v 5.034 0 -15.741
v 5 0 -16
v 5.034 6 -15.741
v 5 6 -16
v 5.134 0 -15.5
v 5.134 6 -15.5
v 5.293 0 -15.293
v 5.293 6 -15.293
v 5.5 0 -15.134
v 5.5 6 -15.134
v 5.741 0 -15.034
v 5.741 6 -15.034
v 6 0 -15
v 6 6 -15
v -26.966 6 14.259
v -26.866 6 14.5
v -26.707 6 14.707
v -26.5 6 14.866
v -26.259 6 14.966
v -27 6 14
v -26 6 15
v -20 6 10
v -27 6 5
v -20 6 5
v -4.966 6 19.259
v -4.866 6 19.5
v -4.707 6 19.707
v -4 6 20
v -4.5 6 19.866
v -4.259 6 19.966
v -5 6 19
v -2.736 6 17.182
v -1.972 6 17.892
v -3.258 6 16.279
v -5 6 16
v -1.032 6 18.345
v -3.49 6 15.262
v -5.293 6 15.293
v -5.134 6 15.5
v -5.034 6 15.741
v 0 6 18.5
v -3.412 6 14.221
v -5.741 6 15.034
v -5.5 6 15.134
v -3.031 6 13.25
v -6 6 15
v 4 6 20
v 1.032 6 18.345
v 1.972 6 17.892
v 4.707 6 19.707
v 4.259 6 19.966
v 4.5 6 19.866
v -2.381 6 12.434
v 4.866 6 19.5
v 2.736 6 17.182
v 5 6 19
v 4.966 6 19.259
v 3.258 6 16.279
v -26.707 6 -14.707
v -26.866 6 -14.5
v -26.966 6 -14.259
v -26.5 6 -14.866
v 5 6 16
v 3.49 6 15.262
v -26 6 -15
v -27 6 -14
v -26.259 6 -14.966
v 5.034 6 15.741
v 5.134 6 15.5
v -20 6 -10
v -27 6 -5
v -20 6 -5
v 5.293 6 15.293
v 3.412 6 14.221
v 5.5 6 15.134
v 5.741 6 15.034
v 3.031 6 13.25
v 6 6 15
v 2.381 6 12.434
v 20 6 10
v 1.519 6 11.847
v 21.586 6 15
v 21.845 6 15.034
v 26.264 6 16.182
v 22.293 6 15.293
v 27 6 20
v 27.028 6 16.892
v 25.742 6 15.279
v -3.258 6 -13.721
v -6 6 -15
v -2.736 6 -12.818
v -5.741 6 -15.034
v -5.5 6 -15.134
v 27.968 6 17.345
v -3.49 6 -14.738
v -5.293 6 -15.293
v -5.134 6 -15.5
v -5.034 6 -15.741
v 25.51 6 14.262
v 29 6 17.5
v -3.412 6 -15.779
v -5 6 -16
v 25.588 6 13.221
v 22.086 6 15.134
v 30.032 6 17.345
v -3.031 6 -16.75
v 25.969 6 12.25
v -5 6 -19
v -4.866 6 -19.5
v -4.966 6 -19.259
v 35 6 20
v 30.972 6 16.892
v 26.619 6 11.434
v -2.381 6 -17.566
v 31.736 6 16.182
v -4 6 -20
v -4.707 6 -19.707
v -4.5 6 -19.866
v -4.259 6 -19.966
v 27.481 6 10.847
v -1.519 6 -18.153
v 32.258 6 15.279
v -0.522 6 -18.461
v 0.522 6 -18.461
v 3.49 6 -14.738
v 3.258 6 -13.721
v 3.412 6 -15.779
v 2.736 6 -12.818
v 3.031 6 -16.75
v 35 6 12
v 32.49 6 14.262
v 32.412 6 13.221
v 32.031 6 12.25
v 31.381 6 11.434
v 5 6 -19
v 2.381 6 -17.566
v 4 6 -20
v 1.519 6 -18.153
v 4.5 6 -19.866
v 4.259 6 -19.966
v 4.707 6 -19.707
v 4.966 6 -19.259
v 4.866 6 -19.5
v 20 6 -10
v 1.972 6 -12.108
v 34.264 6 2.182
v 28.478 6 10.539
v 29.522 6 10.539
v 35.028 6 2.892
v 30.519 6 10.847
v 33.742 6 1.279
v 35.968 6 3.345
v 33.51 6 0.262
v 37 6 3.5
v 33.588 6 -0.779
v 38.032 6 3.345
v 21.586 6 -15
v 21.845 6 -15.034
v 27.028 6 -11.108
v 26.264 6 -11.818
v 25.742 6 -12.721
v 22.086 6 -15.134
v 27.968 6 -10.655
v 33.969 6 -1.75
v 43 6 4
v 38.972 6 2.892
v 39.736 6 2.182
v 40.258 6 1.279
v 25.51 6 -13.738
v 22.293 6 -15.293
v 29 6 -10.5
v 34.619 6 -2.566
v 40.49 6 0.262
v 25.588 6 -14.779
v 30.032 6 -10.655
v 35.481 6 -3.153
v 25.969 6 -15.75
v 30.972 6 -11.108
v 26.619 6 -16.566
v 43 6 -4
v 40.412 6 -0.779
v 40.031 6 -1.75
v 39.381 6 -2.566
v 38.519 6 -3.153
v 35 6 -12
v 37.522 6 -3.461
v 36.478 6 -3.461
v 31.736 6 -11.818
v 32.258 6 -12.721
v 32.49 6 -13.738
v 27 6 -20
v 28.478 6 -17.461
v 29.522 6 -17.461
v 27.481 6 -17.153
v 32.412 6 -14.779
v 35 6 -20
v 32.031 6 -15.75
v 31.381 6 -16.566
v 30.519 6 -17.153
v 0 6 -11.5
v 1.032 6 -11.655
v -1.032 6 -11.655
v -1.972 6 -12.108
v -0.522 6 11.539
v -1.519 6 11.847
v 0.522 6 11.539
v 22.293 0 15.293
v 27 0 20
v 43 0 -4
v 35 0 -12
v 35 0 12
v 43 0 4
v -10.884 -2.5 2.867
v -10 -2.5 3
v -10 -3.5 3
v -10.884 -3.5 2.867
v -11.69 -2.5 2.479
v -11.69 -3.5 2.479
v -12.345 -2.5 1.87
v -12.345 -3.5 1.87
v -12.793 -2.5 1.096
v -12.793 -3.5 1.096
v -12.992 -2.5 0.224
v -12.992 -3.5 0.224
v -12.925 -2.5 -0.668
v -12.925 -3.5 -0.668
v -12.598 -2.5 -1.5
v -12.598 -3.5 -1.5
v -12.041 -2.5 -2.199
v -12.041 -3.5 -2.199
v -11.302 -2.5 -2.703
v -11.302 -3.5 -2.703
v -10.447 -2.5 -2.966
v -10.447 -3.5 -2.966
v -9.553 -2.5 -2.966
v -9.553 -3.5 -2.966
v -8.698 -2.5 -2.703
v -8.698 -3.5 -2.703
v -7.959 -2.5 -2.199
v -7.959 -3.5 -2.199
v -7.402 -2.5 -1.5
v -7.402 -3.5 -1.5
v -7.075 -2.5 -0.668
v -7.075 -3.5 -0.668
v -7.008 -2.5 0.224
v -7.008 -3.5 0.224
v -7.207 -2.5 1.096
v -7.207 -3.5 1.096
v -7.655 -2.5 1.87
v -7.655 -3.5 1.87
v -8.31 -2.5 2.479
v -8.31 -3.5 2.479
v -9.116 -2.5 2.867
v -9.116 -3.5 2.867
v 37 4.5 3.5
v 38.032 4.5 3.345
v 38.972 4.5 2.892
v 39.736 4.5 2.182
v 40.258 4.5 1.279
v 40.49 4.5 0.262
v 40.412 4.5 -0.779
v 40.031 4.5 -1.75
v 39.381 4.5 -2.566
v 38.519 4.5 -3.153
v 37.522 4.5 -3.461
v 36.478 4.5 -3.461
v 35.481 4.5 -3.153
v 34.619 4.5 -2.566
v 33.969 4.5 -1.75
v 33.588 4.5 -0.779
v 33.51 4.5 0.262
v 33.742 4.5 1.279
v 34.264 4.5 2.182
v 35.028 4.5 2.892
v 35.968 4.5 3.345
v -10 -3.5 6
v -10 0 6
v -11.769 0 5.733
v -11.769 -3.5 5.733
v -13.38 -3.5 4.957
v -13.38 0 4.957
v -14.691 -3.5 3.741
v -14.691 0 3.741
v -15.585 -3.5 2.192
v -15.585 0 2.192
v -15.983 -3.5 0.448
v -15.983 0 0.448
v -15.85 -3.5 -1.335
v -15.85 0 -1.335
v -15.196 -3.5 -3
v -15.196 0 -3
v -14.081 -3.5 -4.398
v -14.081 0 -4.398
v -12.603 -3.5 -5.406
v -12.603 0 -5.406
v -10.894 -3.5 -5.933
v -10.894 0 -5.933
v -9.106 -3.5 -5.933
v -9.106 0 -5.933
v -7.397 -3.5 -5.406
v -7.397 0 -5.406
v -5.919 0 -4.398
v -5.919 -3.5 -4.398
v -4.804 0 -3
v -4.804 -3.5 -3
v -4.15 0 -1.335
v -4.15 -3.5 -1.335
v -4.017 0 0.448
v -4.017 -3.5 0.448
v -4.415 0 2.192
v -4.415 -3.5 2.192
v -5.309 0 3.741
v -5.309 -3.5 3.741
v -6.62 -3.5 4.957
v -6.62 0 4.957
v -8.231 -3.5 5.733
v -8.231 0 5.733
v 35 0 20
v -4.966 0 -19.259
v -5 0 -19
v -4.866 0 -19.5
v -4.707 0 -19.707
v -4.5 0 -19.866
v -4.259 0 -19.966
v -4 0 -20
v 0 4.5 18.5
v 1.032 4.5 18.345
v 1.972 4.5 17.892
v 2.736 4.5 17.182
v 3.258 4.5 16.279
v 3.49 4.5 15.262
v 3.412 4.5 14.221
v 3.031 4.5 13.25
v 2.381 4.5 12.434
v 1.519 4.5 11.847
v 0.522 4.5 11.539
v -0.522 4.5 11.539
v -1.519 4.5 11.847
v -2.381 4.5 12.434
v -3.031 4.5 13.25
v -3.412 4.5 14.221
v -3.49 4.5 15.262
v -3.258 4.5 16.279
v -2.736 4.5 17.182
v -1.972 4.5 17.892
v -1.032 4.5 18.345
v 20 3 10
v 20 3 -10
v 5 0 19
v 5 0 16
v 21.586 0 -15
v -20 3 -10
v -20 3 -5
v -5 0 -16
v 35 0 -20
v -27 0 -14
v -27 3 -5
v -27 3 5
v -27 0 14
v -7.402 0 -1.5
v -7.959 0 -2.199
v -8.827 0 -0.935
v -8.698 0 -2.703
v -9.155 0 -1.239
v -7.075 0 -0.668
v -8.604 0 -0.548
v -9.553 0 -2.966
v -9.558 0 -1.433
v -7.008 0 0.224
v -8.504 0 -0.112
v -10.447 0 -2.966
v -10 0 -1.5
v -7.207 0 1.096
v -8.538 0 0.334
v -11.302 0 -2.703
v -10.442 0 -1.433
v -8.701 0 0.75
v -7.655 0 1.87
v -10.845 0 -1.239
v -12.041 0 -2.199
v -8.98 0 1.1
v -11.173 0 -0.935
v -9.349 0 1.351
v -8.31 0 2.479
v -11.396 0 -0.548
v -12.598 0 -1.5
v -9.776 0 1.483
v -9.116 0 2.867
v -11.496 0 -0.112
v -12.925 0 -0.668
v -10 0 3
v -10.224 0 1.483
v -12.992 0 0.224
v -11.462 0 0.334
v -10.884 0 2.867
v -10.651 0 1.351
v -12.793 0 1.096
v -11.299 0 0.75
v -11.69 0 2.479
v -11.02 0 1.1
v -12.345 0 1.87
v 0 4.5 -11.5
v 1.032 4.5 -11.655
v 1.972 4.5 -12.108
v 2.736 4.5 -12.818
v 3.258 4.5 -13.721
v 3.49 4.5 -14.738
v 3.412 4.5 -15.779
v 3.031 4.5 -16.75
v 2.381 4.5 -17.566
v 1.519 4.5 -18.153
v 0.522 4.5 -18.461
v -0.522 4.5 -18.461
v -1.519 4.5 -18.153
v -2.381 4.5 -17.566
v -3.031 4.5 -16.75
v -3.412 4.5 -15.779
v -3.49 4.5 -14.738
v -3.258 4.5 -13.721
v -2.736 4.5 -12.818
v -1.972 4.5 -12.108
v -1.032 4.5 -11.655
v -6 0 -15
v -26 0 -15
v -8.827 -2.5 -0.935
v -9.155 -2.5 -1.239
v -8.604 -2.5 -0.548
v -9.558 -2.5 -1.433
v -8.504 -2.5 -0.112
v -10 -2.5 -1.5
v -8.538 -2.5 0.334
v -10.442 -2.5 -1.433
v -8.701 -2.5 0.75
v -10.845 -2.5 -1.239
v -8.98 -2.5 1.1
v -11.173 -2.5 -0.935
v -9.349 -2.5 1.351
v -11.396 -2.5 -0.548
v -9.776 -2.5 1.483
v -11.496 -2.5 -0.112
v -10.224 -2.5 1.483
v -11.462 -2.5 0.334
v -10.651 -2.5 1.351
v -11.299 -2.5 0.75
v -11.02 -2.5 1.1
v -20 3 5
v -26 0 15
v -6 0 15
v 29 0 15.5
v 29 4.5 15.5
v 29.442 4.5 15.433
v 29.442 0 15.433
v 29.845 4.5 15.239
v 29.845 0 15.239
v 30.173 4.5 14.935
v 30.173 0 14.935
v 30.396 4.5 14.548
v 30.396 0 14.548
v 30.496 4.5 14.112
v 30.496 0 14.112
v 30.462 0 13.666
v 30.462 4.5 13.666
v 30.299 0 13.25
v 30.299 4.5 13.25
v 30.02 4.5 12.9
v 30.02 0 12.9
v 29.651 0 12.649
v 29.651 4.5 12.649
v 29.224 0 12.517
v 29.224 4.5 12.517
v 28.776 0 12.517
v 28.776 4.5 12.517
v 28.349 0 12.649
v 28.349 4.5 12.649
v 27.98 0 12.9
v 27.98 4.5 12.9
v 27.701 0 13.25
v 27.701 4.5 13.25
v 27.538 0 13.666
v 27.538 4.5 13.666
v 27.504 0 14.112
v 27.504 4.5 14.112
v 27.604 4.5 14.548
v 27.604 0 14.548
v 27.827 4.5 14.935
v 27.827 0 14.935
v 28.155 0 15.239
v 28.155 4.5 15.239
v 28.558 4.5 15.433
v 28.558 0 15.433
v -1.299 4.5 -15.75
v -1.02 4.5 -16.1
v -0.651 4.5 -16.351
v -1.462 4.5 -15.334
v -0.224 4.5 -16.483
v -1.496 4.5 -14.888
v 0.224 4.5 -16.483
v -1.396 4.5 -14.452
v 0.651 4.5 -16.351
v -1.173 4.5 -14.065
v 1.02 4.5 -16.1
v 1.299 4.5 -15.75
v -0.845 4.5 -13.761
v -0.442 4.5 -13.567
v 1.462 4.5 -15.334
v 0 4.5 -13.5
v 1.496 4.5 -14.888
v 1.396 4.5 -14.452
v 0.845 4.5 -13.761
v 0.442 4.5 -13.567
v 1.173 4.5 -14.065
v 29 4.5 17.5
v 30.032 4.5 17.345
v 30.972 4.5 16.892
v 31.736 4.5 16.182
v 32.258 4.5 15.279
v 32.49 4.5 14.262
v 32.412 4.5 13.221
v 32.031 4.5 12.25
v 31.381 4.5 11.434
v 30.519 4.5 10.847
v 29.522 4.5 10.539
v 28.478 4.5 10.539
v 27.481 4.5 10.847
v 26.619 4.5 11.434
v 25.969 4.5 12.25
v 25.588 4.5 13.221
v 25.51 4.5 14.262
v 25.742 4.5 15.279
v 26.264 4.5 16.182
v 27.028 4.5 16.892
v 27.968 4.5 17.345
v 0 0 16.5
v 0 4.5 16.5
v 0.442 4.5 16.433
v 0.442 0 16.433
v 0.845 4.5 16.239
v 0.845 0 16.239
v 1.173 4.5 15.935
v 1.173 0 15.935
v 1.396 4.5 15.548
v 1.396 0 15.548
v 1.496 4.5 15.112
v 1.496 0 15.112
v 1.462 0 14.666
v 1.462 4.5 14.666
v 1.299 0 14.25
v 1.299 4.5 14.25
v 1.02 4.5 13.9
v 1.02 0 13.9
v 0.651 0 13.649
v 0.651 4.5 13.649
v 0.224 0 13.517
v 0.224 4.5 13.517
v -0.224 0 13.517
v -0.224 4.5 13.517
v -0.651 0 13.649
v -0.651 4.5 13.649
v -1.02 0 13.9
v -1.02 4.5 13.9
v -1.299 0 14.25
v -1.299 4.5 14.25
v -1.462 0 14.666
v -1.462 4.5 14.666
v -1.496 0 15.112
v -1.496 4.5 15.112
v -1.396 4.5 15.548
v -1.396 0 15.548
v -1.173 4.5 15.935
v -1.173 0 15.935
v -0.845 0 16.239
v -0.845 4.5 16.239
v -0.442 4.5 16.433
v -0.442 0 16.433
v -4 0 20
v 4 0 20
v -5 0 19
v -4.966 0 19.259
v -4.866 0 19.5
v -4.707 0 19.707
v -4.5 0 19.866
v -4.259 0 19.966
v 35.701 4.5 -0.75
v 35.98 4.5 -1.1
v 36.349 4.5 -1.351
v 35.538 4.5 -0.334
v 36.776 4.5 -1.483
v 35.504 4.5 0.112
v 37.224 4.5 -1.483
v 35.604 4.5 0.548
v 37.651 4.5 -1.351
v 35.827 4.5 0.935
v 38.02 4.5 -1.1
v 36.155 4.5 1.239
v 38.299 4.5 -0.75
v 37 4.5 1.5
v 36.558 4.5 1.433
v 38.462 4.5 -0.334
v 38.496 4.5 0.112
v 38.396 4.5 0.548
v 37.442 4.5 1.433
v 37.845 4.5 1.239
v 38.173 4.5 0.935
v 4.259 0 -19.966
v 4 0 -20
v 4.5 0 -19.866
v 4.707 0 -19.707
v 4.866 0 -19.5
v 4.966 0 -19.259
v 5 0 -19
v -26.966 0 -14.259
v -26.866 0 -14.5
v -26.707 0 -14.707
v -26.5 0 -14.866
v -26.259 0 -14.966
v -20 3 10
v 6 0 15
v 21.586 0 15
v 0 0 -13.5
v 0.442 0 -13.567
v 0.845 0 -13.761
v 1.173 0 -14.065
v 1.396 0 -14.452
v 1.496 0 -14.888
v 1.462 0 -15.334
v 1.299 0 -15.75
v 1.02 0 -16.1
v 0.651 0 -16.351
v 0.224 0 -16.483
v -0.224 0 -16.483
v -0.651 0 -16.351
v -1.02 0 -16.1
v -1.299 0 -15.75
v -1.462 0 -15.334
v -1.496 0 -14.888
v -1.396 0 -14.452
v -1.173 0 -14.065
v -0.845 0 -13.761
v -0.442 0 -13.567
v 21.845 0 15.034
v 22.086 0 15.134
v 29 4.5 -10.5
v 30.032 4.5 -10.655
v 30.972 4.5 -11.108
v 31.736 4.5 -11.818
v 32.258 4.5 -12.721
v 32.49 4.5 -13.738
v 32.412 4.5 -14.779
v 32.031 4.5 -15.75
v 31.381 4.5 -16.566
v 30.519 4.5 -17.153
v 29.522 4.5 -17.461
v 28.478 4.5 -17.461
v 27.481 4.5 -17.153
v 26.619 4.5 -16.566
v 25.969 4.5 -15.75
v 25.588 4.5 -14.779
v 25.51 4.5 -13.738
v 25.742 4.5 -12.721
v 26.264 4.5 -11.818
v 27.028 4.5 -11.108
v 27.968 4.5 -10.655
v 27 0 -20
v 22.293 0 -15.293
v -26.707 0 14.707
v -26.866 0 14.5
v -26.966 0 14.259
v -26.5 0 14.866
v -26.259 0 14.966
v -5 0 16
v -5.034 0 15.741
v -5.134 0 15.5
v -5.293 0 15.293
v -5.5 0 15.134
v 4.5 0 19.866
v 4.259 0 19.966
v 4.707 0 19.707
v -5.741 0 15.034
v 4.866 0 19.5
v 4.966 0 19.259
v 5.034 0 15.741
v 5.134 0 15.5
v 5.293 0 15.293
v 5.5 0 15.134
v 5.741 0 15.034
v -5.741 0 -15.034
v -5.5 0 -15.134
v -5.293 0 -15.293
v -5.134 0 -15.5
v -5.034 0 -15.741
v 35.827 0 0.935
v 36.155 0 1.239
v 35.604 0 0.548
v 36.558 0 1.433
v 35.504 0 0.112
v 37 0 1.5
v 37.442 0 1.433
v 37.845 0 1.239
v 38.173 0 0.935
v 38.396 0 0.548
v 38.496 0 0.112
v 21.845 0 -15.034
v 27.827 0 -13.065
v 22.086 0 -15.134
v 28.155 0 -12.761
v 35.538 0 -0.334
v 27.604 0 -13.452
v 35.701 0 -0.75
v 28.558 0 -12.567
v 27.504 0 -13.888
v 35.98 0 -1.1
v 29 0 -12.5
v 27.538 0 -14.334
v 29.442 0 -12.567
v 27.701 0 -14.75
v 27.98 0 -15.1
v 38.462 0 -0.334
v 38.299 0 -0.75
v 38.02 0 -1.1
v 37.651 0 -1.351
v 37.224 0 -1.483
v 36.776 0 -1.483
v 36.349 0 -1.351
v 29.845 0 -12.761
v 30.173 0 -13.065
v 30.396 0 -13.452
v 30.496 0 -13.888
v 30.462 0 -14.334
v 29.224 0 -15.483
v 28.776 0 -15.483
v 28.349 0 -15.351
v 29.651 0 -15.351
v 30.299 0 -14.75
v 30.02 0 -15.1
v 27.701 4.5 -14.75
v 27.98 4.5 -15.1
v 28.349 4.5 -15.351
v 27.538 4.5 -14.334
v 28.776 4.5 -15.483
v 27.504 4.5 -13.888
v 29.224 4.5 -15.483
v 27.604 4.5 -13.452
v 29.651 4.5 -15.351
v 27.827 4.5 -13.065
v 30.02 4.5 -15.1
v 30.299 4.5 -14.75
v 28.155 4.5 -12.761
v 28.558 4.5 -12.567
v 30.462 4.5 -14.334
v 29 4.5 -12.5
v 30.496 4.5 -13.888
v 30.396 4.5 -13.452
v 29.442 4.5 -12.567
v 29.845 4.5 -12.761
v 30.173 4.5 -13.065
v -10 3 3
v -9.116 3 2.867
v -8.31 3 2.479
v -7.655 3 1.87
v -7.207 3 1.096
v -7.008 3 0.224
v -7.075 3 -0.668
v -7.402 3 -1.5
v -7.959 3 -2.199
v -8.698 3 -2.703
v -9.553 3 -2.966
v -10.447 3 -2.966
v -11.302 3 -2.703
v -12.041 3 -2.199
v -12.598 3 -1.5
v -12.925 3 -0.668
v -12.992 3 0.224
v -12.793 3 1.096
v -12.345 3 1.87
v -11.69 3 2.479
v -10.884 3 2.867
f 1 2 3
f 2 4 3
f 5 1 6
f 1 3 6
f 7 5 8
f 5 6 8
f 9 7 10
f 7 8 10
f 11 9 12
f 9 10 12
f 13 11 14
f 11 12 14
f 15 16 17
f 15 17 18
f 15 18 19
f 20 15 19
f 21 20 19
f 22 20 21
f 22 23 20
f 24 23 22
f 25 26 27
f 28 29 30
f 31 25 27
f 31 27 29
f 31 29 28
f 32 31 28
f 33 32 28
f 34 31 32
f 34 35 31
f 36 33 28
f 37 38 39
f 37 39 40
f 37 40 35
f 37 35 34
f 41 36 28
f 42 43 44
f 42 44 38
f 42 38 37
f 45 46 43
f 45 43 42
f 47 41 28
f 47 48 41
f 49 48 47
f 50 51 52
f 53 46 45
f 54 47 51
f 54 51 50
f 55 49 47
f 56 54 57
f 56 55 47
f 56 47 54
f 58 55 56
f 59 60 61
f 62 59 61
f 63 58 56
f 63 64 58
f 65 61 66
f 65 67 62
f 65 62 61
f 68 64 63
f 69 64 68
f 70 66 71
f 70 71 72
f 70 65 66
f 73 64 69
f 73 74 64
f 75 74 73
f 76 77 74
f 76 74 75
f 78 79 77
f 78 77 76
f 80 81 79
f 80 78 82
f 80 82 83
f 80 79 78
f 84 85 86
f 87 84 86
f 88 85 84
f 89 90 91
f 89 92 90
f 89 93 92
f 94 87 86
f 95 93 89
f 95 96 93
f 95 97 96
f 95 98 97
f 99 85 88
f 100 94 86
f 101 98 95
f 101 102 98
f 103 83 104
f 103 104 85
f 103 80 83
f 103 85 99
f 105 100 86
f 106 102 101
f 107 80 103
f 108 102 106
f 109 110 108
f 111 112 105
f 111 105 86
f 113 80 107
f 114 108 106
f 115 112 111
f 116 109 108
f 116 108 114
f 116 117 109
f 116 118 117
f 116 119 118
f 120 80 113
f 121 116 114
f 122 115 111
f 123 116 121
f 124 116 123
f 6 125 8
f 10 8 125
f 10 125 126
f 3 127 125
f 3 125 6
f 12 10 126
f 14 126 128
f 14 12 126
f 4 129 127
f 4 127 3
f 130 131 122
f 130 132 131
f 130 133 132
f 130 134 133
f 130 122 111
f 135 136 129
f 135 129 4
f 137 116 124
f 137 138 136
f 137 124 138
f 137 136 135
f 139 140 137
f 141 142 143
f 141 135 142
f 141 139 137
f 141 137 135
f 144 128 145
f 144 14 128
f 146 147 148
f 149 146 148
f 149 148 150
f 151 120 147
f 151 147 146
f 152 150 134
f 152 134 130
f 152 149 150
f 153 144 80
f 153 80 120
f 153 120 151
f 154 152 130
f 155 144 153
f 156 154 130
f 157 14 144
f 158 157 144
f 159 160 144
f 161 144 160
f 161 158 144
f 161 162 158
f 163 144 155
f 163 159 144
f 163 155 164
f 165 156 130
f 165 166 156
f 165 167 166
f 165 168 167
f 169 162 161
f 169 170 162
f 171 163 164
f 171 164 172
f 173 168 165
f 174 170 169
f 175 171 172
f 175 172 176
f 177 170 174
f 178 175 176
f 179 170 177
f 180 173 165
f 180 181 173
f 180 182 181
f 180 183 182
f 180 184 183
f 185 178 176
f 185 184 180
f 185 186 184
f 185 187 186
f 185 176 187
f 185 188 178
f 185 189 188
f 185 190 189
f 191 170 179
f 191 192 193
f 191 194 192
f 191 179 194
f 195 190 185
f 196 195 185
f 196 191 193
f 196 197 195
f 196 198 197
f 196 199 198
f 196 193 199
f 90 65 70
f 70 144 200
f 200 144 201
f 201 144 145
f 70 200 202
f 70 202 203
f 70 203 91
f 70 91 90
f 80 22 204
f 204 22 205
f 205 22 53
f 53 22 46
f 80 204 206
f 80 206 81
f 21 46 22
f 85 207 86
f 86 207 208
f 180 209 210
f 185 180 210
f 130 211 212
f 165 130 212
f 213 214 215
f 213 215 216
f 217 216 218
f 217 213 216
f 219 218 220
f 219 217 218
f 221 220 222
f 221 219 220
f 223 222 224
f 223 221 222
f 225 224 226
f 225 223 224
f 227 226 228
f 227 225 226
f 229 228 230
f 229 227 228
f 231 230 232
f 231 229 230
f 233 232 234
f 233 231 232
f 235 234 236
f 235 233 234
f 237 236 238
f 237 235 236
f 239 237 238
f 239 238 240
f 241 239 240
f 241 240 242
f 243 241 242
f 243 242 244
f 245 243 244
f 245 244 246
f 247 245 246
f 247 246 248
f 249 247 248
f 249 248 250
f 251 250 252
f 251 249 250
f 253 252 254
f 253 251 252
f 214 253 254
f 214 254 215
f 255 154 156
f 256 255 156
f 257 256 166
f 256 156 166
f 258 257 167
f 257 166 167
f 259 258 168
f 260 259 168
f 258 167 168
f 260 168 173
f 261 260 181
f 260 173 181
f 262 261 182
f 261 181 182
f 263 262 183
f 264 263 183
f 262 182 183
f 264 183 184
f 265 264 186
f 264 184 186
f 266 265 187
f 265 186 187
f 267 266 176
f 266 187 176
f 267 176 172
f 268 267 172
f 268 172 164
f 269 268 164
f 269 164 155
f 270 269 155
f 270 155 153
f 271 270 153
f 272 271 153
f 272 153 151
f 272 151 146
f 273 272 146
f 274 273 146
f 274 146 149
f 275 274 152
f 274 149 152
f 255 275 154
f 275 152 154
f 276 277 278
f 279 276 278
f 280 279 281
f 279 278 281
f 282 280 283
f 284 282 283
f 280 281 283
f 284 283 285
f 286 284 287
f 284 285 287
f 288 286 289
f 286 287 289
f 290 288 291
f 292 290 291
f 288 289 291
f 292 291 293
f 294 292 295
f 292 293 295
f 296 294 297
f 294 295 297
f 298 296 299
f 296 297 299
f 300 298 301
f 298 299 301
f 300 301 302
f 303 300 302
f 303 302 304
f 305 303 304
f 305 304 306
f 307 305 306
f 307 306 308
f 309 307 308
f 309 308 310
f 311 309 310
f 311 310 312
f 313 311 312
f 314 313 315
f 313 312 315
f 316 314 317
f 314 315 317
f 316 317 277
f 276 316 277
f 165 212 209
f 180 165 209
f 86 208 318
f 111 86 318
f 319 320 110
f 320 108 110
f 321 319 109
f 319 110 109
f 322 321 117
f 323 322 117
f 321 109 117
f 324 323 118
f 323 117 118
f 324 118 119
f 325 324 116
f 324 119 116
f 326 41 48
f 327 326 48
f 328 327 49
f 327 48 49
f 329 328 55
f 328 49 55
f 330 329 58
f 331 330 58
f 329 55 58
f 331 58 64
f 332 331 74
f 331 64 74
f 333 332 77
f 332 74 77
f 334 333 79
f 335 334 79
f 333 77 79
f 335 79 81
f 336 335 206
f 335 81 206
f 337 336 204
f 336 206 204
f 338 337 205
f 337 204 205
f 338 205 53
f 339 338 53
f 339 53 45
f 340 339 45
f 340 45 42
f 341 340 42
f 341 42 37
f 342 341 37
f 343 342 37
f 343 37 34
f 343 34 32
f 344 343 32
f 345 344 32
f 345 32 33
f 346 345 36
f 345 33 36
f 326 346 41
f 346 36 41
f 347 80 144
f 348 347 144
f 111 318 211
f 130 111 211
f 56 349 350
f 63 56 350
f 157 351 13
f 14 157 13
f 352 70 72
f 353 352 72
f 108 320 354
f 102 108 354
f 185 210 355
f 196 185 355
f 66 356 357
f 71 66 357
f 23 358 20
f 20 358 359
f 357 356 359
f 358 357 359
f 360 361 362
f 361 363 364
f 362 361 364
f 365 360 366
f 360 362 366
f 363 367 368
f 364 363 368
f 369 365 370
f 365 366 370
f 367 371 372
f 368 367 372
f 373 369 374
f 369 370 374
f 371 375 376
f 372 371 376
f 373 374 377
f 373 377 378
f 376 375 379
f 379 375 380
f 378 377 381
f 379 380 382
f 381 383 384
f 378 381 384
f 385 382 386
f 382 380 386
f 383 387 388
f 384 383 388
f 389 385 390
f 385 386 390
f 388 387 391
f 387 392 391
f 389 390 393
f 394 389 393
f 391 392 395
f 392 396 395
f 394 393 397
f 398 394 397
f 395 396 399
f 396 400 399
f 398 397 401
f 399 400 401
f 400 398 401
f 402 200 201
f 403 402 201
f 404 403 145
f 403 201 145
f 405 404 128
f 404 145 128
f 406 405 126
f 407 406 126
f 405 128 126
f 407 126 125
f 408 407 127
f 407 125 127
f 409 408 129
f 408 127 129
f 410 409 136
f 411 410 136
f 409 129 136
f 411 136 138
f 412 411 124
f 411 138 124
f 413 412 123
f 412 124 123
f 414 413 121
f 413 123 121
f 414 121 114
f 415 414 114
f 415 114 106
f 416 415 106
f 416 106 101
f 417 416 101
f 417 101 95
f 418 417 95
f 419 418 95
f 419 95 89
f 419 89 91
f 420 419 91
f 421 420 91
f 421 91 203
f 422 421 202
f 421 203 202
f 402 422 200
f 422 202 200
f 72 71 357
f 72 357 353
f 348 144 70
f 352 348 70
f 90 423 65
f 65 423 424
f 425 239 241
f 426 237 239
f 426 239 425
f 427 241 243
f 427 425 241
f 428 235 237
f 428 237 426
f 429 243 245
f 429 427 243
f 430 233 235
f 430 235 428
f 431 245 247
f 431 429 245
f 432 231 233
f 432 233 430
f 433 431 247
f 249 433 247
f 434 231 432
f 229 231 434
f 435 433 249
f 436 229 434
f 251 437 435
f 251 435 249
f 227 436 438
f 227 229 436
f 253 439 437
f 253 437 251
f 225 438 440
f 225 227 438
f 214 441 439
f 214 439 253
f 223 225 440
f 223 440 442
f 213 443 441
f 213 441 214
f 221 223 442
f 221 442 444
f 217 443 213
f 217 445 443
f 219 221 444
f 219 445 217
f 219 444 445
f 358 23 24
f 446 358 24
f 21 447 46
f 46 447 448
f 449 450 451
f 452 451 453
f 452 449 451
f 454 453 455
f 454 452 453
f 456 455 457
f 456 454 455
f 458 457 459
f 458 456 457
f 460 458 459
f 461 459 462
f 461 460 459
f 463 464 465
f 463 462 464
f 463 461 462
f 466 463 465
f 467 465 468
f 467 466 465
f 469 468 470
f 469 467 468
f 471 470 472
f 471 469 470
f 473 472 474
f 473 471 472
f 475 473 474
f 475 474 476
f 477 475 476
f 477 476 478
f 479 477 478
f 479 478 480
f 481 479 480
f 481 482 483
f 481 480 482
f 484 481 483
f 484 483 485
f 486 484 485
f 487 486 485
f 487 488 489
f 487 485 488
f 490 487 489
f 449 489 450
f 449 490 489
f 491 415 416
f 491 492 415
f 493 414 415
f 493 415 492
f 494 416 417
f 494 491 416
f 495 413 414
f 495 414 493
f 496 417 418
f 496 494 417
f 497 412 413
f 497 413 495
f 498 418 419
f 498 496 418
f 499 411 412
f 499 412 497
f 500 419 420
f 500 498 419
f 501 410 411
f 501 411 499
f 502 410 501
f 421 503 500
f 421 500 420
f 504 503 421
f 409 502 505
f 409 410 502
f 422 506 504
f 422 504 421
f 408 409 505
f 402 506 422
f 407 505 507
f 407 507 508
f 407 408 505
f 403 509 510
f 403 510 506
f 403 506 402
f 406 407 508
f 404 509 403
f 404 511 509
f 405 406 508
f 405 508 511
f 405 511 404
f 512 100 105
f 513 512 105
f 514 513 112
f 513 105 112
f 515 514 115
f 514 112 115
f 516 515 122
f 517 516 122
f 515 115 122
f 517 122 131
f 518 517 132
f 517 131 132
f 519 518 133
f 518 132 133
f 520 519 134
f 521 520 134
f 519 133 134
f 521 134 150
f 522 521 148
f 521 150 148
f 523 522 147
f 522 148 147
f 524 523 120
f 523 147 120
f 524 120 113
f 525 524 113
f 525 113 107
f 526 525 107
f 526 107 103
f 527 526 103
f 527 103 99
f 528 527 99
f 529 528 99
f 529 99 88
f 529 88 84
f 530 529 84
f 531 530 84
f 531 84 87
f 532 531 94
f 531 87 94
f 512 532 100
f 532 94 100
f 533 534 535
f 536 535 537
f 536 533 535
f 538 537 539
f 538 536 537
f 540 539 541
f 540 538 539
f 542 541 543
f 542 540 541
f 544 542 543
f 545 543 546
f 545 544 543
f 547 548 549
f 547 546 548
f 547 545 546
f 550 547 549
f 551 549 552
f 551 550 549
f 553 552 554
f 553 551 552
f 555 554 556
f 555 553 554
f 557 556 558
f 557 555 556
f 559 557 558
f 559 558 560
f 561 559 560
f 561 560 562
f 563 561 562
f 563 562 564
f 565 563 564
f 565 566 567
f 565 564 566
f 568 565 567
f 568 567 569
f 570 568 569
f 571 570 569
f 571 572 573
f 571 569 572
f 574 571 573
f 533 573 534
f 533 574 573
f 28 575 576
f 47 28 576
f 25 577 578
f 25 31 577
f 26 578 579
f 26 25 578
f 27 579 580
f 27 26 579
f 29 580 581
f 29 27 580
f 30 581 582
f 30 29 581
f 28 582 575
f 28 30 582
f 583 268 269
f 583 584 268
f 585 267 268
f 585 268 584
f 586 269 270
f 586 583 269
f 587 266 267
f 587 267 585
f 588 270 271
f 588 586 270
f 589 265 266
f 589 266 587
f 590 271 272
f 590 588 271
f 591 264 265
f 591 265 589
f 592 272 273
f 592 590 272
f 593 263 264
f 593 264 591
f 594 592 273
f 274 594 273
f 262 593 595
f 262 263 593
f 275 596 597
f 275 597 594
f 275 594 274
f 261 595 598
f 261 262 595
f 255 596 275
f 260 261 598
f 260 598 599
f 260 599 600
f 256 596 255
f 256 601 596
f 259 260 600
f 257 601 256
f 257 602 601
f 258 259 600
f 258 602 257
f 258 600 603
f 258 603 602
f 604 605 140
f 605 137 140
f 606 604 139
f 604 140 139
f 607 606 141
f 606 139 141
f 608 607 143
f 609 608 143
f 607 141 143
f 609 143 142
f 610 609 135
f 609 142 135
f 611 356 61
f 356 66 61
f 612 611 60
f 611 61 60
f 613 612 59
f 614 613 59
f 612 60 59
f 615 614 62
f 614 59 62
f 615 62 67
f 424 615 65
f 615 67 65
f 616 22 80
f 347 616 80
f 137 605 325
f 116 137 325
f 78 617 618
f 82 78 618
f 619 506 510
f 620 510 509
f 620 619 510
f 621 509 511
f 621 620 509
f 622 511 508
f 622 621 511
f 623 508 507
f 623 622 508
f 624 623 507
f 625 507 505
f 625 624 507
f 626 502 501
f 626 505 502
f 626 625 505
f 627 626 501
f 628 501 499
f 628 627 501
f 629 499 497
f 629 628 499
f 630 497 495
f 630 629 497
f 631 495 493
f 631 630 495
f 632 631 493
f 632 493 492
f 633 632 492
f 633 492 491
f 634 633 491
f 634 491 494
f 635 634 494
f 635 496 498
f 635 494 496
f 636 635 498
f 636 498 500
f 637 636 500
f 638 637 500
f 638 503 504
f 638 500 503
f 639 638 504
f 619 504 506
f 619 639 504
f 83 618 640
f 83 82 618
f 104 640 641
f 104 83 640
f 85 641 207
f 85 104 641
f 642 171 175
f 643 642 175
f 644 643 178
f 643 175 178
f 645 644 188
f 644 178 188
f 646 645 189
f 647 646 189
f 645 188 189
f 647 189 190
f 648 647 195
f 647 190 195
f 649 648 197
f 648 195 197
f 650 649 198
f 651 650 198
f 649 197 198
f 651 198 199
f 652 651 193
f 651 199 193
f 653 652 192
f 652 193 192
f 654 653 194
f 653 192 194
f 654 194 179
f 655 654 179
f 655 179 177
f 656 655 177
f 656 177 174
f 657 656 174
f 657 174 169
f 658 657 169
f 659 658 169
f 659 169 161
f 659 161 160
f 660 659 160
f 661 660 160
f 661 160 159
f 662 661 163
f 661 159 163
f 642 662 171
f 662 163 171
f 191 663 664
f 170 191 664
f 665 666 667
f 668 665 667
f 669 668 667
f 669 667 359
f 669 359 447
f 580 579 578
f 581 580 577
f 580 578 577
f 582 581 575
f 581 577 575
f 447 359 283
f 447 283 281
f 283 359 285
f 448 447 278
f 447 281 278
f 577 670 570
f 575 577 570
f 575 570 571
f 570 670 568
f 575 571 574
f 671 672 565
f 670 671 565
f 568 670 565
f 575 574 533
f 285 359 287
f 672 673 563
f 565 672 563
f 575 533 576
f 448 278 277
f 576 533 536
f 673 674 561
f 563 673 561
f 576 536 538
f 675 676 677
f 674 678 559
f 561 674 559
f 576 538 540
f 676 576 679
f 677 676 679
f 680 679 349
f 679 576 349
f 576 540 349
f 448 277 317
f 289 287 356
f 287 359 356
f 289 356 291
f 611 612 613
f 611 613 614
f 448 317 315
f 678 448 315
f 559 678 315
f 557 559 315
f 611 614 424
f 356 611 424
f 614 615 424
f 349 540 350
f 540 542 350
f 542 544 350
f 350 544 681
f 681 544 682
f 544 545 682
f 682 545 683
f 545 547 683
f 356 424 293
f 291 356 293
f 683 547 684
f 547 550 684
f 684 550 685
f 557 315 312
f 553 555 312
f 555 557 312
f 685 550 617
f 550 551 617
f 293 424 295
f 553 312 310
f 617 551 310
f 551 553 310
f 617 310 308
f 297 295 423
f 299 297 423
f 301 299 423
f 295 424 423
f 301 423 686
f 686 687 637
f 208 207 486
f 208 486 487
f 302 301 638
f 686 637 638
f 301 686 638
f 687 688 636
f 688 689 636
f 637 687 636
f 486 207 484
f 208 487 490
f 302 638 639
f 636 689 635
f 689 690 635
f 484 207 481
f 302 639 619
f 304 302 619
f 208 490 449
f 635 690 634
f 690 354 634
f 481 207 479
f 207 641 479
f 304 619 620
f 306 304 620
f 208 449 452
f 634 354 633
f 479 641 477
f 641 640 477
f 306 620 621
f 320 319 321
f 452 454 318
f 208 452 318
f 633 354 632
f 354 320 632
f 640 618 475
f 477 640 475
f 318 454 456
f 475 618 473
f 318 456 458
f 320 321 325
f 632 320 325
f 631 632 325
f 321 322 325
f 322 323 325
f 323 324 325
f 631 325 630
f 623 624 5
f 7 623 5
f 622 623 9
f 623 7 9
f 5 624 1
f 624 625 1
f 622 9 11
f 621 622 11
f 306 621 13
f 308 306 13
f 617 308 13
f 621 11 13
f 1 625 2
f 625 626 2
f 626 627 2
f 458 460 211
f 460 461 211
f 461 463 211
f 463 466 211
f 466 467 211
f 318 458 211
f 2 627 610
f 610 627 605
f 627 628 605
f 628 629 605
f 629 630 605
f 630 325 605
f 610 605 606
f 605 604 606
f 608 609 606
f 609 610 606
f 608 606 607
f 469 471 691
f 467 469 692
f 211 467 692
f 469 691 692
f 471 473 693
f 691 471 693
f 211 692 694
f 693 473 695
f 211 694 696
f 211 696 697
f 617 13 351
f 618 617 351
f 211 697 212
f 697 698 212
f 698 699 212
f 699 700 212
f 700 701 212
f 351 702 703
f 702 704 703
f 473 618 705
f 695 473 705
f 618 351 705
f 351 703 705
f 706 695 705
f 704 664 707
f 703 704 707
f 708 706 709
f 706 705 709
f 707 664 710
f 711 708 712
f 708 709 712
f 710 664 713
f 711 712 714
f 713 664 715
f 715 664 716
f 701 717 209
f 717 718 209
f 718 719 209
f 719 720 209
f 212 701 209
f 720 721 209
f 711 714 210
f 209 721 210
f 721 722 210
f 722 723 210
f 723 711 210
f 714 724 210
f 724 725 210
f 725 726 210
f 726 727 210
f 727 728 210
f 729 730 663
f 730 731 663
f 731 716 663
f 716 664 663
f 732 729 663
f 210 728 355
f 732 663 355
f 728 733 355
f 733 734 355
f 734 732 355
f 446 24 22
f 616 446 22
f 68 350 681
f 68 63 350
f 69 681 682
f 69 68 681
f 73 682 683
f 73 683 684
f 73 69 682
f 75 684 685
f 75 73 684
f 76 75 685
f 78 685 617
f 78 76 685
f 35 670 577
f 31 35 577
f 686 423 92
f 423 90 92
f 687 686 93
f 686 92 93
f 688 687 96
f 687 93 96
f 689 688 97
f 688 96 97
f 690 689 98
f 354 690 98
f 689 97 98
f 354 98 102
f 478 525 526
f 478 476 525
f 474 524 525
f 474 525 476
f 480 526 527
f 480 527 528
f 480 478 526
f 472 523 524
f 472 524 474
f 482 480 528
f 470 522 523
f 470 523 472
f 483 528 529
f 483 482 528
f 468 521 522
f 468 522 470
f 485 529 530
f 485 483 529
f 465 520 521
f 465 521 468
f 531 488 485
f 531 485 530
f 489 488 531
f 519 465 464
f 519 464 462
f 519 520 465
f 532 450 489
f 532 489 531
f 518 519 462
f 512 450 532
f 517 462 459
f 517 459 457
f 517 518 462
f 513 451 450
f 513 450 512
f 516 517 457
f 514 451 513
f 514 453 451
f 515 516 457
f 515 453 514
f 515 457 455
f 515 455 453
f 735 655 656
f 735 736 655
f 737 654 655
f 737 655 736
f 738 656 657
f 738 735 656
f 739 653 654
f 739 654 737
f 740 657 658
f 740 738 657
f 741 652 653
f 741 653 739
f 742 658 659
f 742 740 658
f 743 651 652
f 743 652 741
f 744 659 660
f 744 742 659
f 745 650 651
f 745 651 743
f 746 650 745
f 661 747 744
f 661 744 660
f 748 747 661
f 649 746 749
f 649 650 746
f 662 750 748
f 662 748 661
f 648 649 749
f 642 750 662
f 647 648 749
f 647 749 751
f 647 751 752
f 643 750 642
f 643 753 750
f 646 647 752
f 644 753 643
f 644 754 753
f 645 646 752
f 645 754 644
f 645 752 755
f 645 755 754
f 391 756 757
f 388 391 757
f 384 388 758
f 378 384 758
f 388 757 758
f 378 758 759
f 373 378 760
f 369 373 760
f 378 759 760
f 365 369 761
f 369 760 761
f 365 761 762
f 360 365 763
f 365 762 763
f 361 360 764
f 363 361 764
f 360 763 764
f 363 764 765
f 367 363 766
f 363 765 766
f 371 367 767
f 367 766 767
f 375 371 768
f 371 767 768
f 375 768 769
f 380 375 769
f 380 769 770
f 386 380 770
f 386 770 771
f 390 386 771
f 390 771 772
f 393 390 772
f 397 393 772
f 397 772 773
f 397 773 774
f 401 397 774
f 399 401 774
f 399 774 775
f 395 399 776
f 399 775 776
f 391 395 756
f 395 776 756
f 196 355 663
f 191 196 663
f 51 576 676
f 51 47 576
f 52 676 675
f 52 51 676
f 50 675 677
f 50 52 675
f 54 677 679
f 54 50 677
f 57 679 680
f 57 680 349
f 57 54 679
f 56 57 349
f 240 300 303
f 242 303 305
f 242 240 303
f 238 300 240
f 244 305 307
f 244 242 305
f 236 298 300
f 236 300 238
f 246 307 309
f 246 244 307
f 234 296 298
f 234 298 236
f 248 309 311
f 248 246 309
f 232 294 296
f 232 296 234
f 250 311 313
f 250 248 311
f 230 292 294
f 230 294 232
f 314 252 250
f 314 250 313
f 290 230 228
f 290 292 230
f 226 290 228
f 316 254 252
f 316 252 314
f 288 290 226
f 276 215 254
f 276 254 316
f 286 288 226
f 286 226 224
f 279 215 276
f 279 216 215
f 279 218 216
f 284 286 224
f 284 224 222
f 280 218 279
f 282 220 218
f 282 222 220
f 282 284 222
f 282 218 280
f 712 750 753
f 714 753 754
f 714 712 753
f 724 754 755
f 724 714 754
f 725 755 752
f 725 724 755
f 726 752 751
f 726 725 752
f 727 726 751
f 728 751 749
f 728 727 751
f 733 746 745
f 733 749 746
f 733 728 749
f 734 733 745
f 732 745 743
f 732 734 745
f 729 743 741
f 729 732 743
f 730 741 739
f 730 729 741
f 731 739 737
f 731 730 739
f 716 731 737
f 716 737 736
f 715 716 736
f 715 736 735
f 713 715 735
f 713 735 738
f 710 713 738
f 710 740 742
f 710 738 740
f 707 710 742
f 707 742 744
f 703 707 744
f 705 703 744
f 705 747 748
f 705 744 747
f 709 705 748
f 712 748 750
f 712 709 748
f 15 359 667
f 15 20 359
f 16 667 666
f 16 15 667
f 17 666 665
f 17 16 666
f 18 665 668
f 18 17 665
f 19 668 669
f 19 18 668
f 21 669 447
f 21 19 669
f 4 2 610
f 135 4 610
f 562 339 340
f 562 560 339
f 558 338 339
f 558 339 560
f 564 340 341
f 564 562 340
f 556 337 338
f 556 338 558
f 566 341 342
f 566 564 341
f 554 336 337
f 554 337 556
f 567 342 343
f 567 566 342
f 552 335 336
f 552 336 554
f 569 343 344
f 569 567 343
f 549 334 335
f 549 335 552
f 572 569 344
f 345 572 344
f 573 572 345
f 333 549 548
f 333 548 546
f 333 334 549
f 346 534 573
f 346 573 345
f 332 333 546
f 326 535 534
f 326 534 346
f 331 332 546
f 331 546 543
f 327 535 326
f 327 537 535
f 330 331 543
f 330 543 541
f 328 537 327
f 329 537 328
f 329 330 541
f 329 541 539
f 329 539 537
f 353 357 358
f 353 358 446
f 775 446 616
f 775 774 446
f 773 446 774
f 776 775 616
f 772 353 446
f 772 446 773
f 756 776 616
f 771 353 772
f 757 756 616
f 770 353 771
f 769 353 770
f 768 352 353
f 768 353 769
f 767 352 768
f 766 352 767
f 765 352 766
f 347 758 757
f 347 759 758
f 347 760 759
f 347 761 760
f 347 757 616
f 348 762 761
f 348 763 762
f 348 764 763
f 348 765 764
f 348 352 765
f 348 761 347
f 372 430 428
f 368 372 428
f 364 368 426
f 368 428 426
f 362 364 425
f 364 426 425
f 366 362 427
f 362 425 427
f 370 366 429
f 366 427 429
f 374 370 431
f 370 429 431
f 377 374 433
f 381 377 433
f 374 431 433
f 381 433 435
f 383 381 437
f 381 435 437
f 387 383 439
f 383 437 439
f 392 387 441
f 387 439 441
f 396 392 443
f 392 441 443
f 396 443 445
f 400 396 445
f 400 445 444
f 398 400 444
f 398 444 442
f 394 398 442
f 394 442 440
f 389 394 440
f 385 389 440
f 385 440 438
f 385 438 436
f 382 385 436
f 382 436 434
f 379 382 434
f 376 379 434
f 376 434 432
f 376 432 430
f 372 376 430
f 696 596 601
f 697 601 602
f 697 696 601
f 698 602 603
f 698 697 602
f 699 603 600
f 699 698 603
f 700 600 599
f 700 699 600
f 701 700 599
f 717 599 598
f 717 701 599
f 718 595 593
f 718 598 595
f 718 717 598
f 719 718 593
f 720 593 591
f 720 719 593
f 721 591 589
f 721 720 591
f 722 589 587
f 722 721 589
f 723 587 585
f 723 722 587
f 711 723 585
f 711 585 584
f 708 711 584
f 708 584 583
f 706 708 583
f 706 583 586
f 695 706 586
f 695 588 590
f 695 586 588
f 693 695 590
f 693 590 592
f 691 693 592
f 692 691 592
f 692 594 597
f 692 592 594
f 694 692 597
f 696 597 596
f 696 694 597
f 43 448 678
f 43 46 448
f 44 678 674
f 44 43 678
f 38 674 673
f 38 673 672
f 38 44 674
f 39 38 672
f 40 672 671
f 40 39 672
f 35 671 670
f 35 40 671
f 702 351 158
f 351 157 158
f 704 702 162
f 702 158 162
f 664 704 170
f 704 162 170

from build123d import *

# Parameters (mm, degrees)
SKETCH_1_R          = 1.5
EXTRUDE_1_DEPTH     = 6
SKETCH_2_W          = 7
SKETCH_2_H          = 5
CUT_EXTRUDE_1_DEPTH = 3
SKETCH_3_R          = 3.5
CUT_EXTRUDE_2_DEPTH = 1.5
SKETCH_5_R          = 3
CUT_EXTRUDE_3_DEPTH = 3
SKETCH_6_R          = 6
EXTRUDE_2_DEPTH     = 3.5
CUT_EXTRUDE_START   = -1
SKETCH_7_R          = 3
CUT_EXTRUDE_4_DEPTH = 1
SKETCH_8_R          = 1.5
CUT_EXTRUDE_5_DEPTH = 49.179352424
FILLET_1_R          = 1


with BuildPart() as part:
    # 草图1 → 凸台-拉伸1 (new body)
    with BuildSketch(Plane(origin=(0, 0, 0), x_dir=(1, 0, 0), z_dir=(0, 1, 0))):
        Polygon((-27, 15), (-27, -15), (-5, -15), (-5, -20), (5, -20), (5, -15), (22, -15), (27, -20), (35, -20), (35, -12), (43, -4), (43, 4), (35, 12), (35, 20), (27, 20), (22, 15), (5, 15), (5, 20), (-5, 20), (-5, 15), align=None)
        with Locations(Location((0, 15, 0), (0, 0, 270))):
            Circle(SKETCH_1_R, mode=Mode.SUBTRACT)
        with Locations(Location((0, -15, 0), (0, 0, 270))):
            Circle(SKETCH_1_R, mode=Mode.SUBTRACT)
        with Locations(Location((29, 14, 0), (0, 0, 270))):
            Circle(SKETCH_1_R, mode=Mode.SUBTRACT)
        with Locations(Location((37, 0, 0), (0, 0, 270))):
            Circle(SKETCH_1_R, mode=Mode.SUBTRACT)
        with Locations(Location((29, -14, 0), (0, 0, 270))):
            Circle(SKETCH_1_R, mode=Mode.SUBTRACT)
    extrude(amount=EXTRUDE_1_DEPTH)

    # 草图2 → 切除-拉伸1 (cut)
    with BuildSketch(Plane(origin=(0, 6, 0), x_dir=(1, 0, 0), z_dir=(0, 1, 0))):
        with Locations((-23.5, 2.5)):
            Rectangle(SKETCH_2_W, SKETCH_2_H)
        with Locations((-23.5, -2.5)):
            Rectangle(SKETCH_2_W, SKETCH_2_H)
        Polygon((20, 10), (-20, 10), (-20, 5), (-20, 0), (20, 0), align=None)
        Polygon((20, 0), (-20, 0), (-20, -5), (-20, -10), (20, -10), align=None)
    extrude(amount=-CUT_EXTRUDE_1_DEPTH, mode=Mode.SUBTRACT)

    # 草图3 → 切除-拉伸2 (cut)
    with BuildSketch(Plane(origin=(0, 6, 0), x_dir=(1, 0, 0), z_dir=(0, 1, 0))):
        with Locations(Location((0, 15, 0), (0, 0, 270))):
            Circle(SKETCH_3_R)
        with Locations(Location((0, -15, 0), (0, 0, 270))):
            Circle(SKETCH_3_R)
        with Locations(Location((29, -14, 0), (0, 0, 270))):
            Circle(SKETCH_3_R)
        with Locations(Location((37, 0, 0), (0, 0, 270))):
            Circle(SKETCH_3_R)
        with Locations(Location((29, 14, 0), (0, 0, 270))):
            Circle(SKETCH_3_R)
    extrude(amount=-CUT_EXTRUDE_2_DEPTH, mode=Mode.SUBTRACT)

    # 草图5 → 切除-拉伸3 (cut)
    with BuildSketch(Plane(origin=(0, 3, 0), x_dir=(1, 0, 0), z_dir=(0, 1, 0))):
        with Locations(Location((-10, 0, 0), (0, 0, 270))):
            Circle(SKETCH_5_R)
    extrude(amount=-CUT_EXTRUDE_3_DEPTH, mode=Mode.SUBTRACT)

    # 草图6 → 凸台-拉伸2 (add)
    with BuildSketch(Plane.XZ):
        with Locations(Location((-10, 0, 0), (0, 0, 90))):
            Circle(SKETCH_6_R)
    extrude(amount=EXTRUDE_2_DEPTH)

    # 草图7 → 切除-拉伸4 (cut)
    with BuildSketch(Plane.XZ.offset(3.5).offset(CUT_EXTRUDE_START)):
        with Locations(Location((-10, 0, 0), (0, 0, 90))):
            Circle(SKETCH_7_R)
    extrude(amount=CUT_EXTRUDE_4_DEPTH, mode=Mode.SUBTRACT)

    # 草图8 → 切除-拉伸5 (cut, through all)
    with BuildSketch(Plane.XZ.offset(2.5)):
        with Locations(Location((-10, 0, 0), (0, 0, 270))):
            Circle(SKETCH_8_R)
    extrude(amount=-CUT_EXTRUDE_5_DEPTH, mode=Mode.SUBTRACT)

    # 圆角1
    fillet_1_edges = [part.edges().sort_by_distance(p)[0] for p in [
        (22, 3, -15),
        (22, 3, 15),
        (5, 3, 15),
        (5, 3, 20),
        (-5, 3, 20),
        (-5, 3, 15),
        (-27, 3, 15),
        (-27, 3, -15),
        (-5, 3, -15),
        (-5, 3, -20),
        (5, 3, -20),
        (5, 3, -15),
    ]]
    fillet(fillet_1_edges, radius=FILLET_1_R)


solid = part.part
